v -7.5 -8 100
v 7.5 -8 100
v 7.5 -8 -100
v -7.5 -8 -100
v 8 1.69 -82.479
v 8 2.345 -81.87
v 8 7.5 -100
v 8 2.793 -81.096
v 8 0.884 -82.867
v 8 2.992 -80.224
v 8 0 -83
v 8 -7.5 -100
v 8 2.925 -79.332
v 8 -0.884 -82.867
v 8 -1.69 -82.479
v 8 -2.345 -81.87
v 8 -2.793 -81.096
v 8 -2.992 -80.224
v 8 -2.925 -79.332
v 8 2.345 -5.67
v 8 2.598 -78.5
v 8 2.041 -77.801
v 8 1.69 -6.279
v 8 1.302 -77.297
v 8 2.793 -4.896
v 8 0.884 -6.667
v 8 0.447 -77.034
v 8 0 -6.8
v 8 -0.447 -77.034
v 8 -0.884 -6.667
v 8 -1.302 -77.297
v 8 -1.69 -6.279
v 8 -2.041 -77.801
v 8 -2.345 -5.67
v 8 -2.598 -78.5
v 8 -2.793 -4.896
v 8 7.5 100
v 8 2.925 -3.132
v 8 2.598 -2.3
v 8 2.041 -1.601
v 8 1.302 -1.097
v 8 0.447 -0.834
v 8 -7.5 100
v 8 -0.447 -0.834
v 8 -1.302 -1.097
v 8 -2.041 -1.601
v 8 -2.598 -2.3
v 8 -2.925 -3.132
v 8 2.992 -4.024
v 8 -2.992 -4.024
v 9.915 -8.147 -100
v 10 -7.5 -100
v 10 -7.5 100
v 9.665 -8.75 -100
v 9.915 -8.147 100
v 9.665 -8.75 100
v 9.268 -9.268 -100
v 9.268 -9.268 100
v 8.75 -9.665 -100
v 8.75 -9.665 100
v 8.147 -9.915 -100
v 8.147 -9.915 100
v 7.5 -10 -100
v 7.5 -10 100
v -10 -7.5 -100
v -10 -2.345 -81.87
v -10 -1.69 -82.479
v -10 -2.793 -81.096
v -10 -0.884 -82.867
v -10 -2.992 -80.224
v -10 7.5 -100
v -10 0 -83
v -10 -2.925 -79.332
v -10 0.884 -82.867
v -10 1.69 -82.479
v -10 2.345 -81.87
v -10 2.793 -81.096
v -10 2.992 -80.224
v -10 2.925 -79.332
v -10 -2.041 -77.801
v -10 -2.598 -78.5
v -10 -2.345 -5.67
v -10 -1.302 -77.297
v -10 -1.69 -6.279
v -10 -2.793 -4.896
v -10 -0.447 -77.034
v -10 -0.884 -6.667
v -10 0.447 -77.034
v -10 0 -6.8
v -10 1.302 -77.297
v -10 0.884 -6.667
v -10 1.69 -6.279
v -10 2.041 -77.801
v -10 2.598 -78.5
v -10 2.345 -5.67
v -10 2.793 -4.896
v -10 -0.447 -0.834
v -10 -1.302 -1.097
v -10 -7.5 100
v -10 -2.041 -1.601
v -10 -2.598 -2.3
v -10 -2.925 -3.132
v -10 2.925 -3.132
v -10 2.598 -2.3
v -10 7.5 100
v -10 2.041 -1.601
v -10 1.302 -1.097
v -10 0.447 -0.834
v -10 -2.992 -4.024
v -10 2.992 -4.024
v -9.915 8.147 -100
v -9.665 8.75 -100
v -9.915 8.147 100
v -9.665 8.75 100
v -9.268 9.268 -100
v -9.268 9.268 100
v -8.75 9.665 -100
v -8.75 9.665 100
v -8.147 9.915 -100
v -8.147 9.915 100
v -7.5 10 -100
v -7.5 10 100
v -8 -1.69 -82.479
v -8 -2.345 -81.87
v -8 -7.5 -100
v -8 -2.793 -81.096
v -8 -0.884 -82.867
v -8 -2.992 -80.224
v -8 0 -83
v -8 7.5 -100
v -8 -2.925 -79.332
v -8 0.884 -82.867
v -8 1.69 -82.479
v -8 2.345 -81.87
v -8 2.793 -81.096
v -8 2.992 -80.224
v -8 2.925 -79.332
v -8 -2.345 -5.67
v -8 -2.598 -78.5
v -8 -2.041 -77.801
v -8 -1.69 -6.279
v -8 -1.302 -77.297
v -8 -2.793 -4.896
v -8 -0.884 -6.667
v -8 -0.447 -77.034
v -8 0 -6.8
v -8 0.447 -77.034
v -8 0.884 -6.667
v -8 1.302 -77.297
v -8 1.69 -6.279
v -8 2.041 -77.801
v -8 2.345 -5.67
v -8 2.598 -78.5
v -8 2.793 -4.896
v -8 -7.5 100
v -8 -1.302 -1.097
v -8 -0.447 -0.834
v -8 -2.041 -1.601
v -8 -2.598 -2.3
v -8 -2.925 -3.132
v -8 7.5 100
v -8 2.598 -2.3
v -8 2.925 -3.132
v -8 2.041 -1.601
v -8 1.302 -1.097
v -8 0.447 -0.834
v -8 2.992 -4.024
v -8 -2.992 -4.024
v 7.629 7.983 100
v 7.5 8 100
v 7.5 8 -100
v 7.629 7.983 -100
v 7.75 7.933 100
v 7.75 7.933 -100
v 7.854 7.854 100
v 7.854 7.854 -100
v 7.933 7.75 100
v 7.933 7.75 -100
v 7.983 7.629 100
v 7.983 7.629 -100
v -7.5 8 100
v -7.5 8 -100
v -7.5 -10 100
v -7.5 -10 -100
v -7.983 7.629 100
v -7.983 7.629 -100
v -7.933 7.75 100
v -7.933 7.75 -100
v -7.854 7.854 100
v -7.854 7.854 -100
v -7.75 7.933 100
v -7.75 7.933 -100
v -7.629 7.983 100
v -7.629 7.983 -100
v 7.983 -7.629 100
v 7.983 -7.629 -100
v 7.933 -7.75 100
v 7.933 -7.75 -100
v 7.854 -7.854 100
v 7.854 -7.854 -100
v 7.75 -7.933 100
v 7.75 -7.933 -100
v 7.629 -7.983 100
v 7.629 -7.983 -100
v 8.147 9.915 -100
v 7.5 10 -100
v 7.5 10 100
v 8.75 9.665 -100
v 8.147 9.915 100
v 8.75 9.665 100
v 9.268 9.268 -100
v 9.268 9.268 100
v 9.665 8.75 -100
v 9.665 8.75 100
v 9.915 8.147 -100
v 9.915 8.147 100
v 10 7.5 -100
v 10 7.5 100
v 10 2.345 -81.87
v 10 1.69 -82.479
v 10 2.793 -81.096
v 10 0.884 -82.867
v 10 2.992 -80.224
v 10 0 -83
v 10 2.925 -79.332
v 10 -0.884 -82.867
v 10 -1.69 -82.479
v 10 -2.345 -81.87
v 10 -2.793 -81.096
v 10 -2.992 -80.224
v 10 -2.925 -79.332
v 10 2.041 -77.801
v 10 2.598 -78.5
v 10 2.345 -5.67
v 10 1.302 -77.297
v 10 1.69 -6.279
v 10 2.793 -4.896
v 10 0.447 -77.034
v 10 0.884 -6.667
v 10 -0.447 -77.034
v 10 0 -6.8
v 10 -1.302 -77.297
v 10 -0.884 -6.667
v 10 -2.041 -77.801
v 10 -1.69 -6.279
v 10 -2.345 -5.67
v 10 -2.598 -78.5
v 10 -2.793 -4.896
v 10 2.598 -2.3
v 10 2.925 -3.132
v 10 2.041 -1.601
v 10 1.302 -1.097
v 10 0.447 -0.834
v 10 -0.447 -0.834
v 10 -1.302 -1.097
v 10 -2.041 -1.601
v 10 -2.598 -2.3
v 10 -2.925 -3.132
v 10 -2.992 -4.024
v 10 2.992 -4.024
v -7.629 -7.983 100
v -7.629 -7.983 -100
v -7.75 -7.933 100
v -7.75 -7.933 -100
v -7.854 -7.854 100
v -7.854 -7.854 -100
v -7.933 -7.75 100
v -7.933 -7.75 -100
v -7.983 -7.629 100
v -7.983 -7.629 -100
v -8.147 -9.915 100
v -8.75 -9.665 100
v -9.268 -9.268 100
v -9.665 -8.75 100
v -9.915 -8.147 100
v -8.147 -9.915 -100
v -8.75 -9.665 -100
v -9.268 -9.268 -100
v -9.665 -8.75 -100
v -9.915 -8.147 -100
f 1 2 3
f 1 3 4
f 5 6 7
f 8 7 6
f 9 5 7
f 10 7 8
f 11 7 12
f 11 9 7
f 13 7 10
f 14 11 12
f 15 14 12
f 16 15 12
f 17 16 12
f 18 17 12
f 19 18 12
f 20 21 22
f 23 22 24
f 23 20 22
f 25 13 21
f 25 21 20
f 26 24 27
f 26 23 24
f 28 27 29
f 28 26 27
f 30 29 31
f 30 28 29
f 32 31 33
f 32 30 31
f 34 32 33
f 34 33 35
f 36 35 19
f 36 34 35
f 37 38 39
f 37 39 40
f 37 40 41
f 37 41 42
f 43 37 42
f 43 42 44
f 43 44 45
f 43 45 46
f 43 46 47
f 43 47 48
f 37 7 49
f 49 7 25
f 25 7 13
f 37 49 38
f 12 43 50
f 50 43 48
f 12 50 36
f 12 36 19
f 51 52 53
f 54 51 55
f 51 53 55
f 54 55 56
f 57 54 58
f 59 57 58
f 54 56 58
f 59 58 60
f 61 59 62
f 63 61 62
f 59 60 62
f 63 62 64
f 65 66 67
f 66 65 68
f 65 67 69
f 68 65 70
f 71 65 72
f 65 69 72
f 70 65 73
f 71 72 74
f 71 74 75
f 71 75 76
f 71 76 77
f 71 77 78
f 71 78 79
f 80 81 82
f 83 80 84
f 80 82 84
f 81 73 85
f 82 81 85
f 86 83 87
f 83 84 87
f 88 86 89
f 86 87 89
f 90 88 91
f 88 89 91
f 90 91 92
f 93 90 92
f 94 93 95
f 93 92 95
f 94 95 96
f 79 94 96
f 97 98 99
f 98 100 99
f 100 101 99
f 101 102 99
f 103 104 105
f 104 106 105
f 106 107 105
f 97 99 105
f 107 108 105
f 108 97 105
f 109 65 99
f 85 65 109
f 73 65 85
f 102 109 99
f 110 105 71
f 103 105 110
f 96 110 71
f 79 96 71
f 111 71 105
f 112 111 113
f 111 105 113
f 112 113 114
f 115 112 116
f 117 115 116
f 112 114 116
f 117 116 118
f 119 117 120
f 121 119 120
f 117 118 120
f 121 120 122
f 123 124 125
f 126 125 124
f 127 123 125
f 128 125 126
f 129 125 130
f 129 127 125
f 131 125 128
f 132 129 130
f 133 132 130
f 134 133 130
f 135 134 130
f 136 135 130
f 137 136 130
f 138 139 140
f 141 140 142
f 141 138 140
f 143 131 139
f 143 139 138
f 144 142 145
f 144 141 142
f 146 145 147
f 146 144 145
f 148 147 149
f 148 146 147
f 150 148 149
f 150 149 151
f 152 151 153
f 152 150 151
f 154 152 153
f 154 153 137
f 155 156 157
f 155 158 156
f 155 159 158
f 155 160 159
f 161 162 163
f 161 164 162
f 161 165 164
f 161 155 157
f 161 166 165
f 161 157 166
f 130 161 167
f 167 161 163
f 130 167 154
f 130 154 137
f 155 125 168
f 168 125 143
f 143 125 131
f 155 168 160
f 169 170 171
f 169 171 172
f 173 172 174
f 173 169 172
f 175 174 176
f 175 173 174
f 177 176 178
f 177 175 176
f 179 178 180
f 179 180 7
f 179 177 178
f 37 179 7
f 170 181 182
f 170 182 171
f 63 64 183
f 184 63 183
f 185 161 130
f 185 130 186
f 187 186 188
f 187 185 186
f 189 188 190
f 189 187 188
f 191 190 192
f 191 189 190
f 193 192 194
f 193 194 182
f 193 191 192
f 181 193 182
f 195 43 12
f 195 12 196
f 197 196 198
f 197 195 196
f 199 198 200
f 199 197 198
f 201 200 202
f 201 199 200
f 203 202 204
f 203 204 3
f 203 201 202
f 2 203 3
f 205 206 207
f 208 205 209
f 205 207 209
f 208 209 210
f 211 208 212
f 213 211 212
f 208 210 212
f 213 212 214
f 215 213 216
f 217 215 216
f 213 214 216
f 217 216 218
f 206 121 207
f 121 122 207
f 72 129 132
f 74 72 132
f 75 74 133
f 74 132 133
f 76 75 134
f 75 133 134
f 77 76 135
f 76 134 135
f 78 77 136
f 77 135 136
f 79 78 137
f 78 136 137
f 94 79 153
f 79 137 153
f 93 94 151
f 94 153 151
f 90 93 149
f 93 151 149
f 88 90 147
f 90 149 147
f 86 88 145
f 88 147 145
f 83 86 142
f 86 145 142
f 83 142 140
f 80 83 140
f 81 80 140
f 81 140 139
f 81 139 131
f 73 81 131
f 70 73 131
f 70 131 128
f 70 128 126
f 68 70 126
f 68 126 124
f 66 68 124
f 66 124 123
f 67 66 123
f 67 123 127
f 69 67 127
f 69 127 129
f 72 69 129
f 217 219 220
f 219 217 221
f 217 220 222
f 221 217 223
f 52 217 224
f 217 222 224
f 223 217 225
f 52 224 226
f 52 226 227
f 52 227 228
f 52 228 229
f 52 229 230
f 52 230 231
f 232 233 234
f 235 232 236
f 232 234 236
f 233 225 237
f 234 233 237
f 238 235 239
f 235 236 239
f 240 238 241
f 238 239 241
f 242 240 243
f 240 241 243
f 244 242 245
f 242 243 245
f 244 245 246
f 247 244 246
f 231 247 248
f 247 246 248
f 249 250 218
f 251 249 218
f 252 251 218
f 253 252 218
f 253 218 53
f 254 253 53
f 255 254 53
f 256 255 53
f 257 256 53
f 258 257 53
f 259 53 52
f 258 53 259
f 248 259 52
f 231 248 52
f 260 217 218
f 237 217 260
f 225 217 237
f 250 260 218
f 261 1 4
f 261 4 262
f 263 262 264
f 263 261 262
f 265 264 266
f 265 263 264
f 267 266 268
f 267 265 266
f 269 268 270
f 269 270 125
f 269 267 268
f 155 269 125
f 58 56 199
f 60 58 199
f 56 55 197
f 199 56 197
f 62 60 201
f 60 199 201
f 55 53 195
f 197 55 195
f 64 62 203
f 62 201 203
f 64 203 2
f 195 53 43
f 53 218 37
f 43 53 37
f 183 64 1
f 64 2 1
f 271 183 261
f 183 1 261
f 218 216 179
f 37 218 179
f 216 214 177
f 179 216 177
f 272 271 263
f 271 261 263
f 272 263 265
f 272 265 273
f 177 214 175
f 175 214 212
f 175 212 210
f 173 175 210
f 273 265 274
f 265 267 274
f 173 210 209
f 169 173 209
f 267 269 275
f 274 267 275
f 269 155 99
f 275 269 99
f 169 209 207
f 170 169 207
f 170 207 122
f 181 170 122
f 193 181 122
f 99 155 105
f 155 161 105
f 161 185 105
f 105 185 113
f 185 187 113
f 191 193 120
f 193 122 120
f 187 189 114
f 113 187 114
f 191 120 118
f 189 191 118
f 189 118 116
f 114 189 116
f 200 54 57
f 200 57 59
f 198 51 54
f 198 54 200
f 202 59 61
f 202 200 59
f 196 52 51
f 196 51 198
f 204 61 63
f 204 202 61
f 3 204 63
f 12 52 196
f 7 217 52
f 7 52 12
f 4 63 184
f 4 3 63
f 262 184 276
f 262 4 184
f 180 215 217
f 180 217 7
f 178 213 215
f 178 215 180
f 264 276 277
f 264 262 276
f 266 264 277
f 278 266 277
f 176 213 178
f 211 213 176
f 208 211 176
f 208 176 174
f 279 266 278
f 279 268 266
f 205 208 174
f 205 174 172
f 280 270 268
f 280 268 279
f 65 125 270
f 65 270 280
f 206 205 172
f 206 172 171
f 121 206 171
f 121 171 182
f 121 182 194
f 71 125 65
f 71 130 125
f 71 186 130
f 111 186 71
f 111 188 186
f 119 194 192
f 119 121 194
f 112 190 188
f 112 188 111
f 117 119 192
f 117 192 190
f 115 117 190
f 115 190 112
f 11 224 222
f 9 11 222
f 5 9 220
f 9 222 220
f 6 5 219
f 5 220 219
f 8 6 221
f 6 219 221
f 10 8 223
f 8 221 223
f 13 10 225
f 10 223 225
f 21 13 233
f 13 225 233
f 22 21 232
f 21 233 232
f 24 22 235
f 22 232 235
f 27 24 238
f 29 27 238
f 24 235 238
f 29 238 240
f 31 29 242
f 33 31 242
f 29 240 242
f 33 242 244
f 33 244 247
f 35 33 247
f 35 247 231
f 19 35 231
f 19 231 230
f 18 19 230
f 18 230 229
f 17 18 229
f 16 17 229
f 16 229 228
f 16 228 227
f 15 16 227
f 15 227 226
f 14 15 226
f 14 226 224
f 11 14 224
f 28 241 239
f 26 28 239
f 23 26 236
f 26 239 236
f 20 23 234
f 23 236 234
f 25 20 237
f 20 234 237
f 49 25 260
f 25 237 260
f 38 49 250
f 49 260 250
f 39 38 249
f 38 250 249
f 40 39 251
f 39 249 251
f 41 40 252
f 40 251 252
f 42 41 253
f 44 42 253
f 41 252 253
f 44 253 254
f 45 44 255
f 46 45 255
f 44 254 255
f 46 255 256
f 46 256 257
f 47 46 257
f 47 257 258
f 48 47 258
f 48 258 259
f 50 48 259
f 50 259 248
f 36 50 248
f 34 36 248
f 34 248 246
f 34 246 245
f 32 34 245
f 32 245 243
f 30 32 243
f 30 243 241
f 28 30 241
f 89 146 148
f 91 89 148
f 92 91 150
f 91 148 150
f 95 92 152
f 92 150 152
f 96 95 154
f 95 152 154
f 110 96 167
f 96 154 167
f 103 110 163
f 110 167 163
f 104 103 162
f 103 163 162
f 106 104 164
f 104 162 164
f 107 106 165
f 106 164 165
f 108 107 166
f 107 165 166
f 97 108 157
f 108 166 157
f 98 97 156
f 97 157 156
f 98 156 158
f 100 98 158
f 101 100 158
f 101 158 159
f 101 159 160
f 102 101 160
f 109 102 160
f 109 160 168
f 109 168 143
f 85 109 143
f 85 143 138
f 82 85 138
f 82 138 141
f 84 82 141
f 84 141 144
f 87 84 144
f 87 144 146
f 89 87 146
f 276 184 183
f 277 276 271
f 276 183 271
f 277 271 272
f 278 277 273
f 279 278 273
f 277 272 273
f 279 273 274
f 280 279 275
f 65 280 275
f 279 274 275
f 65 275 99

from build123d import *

# Parameters (mm, degrees)
EXTRUDE_THIN1_DEPTH   = 100
IZIM1_R               = 3
KES_EKSTR_ZYON1_DEPTH = 20.32


with BuildPart() as part:
    # Sketch1 → Extrude-Thin1 (new body, symmetric)
    with BuildSketch(Plane.XY):
        with BuildLine():
            Line((-10, -7.5), (-10, 7.5))
            ThreePointArc((-10, 7.5), (-9.267766953, 9.267766953), (-7.5, 10))
            Line((-7.5, 10), (7.5, 10))
            ThreePointArc((7.5, 10), (9.267766953, 9.267766953), (10, 7.5))
            Line((10, 7.5), (10, -7.5))
            ThreePointArc((10, -7.5), (9.267766953, -9.267766953), (7.5, -10))
            Line((7.5, -10), (-7.5, -10))
            ThreePointArc((-7.5, -10), (-9.267766953, -9.267766953), (-10, -7.5))
        make_face()
        with BuildLine():
            Line((-8, -7.5), (-8, 7.5))
            ThreePointArc((-8, 7.5), (-7.853553391, 7.853553391), (-7.5, 8))
            Line((-7.5, 8), (7.5, 8))
            ThreePointArc((7.5, 8), (7.853553391, 7.853553391), (8, 7.5))
            Line((8, 7.5), (8, -7.5))
            ThreePointArc((8, -7.5), (7.853553391, -7.853553391), (7.5, -8))
            Line((7.5, -8), (-7.5, -8))
            ThreePointArc((-7.5, -8), (-7.853553391, -7.853553391), (-8, -7.5))
        make_face(mode=Mode.SUBTRACT)
    extrude(amount=EXTRUDE_THIN1_DEPTH, both=True)

    # Çizim1 → Kes-Ekstrüzyon1 (cut)
    with BuildSketch(Plane(origin=(10, 0, 0), x_dir=(0, 0, -1), z_dir=(1, 0, 0))):
        with Locations((80, 0)):
            Circle(IZIM1_R)
        with Locations((3.8, 0)):
            Circle(IZIM1_R)
    extrude(amount=-KES_EKSTR_ZYON1_DEPTH, mode=Mode.SUBTRACT)


solid = part.part
